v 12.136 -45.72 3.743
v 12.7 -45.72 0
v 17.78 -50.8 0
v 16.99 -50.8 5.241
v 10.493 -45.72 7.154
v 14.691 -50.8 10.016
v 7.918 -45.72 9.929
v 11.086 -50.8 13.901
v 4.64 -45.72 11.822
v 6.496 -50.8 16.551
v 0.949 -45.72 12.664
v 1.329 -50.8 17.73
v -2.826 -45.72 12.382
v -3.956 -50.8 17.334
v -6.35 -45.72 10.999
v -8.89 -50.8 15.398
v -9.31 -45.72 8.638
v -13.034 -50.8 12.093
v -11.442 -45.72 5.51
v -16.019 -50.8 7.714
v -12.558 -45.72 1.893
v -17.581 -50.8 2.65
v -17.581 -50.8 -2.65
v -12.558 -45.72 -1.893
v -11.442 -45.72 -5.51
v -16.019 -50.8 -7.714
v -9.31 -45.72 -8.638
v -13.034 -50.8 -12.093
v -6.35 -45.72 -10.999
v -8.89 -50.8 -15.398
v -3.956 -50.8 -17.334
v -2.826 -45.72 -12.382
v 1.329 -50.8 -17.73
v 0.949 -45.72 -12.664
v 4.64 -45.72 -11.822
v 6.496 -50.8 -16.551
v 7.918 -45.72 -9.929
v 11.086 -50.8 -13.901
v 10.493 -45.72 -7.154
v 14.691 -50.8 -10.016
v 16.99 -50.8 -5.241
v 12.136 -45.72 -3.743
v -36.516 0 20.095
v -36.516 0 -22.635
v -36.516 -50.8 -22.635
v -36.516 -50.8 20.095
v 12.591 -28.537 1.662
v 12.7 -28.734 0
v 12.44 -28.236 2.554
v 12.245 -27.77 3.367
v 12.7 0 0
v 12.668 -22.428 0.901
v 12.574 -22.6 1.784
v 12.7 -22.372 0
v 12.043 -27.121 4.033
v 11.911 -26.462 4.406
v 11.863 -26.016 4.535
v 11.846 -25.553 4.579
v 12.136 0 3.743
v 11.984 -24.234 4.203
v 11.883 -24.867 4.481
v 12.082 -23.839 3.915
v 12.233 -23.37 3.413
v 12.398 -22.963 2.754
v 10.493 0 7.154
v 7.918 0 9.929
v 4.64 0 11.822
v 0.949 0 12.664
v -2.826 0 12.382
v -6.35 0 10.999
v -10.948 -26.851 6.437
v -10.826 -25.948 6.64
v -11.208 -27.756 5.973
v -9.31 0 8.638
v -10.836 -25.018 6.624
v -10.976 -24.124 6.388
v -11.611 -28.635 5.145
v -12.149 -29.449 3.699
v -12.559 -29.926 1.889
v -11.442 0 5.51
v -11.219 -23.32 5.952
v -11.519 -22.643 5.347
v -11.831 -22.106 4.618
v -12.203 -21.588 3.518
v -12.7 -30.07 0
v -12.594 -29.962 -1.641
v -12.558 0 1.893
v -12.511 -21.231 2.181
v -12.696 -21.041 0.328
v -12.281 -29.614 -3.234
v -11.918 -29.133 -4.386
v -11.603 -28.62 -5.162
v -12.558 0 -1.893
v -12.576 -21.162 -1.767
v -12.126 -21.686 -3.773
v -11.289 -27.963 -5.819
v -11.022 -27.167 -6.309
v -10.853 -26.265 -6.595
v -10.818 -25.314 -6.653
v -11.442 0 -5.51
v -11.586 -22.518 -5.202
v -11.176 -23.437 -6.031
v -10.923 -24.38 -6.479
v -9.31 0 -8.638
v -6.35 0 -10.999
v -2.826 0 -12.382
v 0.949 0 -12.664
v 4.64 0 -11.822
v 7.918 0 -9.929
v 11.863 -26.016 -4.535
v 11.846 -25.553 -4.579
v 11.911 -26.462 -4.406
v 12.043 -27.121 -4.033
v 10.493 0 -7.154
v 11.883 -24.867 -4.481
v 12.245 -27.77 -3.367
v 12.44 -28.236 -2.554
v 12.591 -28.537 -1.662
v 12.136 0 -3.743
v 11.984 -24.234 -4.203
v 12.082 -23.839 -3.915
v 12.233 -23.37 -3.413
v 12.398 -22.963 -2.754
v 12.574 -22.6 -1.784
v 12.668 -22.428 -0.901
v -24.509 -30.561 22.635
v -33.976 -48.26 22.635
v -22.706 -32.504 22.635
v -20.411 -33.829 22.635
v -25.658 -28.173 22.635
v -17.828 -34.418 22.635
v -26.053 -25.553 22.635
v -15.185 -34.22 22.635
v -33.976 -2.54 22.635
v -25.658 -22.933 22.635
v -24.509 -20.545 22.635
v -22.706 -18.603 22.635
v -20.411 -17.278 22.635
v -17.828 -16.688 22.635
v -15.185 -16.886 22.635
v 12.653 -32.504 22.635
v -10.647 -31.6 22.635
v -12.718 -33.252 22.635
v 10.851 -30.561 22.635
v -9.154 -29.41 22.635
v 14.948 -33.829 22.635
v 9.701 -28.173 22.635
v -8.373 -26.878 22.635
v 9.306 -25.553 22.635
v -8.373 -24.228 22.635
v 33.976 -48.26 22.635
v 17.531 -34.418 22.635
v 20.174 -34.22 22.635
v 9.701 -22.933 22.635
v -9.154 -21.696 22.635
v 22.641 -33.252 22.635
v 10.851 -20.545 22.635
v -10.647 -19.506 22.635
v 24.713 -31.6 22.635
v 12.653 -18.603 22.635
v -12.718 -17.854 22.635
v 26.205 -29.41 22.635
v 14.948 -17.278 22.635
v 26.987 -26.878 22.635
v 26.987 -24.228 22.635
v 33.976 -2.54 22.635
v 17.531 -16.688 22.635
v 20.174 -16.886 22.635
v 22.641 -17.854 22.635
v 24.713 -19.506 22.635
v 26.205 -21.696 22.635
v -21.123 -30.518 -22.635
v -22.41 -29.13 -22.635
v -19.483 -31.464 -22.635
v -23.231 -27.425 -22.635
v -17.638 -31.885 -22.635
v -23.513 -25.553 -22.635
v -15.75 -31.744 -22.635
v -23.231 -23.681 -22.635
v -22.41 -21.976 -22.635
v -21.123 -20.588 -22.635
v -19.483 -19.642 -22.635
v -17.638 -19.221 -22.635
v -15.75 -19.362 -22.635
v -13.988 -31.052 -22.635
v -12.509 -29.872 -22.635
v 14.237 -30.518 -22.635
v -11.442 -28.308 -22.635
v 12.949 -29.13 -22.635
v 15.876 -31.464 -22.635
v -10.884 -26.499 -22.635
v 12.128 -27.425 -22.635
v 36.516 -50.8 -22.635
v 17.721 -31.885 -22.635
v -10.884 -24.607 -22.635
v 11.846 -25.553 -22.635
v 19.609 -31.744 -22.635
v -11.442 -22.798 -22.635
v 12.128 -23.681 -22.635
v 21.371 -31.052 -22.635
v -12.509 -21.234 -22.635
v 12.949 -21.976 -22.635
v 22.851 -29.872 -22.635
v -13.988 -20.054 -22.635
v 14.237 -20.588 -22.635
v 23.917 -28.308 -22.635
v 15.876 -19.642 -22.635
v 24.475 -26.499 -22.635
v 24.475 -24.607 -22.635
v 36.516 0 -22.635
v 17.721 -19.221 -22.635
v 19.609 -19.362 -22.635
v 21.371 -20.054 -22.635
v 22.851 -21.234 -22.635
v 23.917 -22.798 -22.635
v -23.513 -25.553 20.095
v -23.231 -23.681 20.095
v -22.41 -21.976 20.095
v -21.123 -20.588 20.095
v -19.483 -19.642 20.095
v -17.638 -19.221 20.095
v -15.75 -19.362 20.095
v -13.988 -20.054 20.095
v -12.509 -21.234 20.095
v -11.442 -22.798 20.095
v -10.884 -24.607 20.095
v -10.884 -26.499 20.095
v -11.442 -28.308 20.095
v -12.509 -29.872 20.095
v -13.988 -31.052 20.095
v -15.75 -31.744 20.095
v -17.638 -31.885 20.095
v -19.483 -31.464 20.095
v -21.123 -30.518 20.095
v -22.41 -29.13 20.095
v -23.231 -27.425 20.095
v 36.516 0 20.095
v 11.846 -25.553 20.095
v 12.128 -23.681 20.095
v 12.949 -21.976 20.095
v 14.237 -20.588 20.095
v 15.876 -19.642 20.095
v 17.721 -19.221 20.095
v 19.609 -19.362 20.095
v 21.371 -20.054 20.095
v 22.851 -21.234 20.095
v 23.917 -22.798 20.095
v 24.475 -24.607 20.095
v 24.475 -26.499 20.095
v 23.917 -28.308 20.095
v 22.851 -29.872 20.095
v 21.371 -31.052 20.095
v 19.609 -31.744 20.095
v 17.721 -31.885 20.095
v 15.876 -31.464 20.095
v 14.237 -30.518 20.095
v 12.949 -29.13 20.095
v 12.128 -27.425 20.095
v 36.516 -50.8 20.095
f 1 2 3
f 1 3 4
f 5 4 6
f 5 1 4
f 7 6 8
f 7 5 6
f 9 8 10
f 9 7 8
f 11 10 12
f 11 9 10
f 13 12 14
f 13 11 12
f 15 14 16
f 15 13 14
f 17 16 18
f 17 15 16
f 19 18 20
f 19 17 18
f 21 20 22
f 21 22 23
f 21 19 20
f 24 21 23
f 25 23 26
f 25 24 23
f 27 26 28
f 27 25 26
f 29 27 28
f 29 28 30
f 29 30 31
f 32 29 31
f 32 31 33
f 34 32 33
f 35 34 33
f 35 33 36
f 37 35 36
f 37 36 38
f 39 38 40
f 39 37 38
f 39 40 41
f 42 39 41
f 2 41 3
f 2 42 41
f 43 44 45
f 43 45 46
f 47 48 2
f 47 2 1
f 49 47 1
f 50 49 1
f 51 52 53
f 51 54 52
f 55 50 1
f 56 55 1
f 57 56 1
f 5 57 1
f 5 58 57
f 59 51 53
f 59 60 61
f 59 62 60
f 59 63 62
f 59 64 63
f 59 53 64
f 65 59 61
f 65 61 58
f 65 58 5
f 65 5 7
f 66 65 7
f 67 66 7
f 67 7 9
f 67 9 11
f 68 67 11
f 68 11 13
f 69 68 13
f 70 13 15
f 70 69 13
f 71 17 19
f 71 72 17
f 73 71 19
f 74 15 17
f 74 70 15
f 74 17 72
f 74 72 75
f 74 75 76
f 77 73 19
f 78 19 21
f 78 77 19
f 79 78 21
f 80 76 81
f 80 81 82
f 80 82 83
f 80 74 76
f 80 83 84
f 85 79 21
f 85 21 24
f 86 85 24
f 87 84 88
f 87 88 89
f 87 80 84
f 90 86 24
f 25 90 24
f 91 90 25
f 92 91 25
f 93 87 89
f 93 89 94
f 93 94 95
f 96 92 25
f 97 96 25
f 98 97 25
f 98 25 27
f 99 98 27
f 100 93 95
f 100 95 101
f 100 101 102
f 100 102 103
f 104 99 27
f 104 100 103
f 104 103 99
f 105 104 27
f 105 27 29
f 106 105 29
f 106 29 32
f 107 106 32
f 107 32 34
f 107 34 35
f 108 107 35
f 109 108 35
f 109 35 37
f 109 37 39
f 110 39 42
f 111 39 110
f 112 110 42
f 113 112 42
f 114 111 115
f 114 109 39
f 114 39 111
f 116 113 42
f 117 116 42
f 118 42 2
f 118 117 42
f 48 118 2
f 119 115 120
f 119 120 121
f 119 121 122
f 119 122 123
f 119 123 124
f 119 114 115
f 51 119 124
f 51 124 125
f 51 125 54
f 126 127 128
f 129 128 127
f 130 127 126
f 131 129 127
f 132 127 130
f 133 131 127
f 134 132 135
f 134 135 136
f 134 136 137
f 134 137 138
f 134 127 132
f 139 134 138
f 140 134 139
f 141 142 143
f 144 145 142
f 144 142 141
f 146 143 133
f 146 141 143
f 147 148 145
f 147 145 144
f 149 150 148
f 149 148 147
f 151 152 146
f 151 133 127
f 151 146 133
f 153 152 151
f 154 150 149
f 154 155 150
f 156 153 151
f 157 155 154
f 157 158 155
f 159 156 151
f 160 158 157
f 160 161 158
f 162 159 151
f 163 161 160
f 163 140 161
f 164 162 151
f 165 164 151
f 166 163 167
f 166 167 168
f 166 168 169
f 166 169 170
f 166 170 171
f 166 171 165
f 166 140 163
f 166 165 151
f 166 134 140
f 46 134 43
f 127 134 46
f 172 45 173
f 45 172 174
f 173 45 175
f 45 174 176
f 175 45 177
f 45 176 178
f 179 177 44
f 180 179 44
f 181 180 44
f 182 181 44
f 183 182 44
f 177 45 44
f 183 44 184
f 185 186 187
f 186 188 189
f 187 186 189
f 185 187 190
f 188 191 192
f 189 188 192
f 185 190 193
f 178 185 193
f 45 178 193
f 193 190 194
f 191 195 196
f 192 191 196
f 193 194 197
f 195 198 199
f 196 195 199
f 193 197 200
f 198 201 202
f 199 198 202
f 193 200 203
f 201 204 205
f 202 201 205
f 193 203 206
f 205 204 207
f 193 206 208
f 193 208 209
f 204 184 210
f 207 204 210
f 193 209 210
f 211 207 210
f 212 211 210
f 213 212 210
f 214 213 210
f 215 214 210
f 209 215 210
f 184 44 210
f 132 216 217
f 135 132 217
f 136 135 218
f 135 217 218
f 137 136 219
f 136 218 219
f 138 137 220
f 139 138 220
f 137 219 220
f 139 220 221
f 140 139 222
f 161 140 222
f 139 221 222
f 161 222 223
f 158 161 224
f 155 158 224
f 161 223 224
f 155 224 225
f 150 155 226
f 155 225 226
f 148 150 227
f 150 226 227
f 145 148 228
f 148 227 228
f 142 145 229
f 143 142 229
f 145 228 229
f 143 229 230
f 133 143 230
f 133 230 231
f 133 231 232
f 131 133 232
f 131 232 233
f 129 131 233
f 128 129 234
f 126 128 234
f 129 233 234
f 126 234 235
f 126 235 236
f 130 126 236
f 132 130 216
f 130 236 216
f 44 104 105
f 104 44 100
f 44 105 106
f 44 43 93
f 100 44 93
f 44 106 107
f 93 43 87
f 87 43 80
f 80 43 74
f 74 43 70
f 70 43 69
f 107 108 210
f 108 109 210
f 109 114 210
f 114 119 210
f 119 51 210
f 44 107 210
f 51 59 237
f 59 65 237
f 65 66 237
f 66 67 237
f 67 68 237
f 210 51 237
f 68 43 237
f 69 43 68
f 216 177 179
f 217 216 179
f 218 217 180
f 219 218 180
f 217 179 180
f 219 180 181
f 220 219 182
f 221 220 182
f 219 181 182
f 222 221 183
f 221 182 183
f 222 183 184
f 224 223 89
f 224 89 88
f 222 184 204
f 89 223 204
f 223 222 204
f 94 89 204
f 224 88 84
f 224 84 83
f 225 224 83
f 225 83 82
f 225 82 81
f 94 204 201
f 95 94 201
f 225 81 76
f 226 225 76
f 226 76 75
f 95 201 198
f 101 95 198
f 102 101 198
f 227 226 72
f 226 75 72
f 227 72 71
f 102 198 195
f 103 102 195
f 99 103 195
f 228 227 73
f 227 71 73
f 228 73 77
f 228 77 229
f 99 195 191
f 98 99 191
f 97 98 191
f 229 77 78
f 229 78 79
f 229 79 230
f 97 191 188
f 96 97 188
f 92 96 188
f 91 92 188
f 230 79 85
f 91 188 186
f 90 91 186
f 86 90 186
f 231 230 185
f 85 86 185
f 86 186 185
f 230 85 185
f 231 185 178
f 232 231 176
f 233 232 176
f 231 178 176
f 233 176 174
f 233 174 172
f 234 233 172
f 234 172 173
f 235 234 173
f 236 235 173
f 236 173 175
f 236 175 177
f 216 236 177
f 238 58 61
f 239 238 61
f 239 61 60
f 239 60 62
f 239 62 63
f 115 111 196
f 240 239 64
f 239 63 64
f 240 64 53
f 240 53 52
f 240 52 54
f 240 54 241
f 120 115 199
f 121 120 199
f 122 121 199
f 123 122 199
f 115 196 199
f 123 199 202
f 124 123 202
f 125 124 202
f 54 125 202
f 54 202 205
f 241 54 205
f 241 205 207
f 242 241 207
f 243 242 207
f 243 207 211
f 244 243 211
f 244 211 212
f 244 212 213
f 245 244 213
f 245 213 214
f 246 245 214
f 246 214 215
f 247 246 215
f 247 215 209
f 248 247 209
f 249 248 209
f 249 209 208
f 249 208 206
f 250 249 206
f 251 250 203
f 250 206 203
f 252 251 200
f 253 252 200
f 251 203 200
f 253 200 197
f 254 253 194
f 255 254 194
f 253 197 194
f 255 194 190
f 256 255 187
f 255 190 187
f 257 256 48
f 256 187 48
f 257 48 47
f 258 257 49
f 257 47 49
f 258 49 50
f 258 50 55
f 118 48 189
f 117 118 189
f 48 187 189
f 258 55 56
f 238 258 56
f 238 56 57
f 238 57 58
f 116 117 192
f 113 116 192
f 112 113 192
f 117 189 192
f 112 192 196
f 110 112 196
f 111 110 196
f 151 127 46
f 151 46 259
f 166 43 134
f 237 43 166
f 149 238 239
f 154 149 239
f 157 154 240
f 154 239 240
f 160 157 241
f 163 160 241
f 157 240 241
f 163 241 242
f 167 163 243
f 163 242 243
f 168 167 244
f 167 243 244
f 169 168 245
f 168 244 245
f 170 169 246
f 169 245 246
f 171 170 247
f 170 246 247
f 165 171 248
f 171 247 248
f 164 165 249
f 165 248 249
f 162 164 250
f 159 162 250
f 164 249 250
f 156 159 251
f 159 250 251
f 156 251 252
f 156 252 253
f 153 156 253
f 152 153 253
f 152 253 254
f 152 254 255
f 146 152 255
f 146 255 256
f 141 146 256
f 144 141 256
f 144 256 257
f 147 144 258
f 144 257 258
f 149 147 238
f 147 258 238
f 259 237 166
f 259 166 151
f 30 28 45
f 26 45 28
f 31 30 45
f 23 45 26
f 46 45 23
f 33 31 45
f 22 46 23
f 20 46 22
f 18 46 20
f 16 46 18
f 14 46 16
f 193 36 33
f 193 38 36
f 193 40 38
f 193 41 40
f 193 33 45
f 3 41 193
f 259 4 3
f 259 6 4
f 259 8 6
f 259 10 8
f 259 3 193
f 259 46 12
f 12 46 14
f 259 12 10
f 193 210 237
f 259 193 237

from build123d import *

# Parameters (mm, degrees)
F0_W     = 73.031252
F0_H     = 45.270924
F0_R     = 12.7
F1_DEPTH = 50.8
F3_D     = 12.7
F4_SIZE  = 5.08
F5_SIZE  = 2.54


with BuildPart() as f1:
    # F0 (on Front) → F1 (new body)
    with BuildSketch(Plane.XZ):
        Rectangle(F0_W, F0_H)
        Circle(F0_R, mode=Mode.SUBTRACT)
    extrude(amount=F1_DEPTH)

    # F3 (through all)
    with Locations(Plane.XY.offset(22.635462)):
        with Locations((-17.163437, -25.553048), (18.195821, -25.553048)):
            Hole(F3_D / 2)

    # F4
    f4_edges = [f1.edges().sort_by_distance(p)[0] for p in [
        (-12.7, -50.8, 0),
    ]]
    chamfer(f4_edges, length=F4_SIZE)

    # F5
    f5_edges = [f1.edges().sort_by_distance(p)[0] for p in [
        (36.515626, -25.4, 22.635462),
        (0, 0, 22.635462),
        (0, -50.8, 22.635462),
        (-36.515626, -25.4, 22.635462),
        (11.845821, -25.553048, 22.635462),
        (-23.513437, -25.553048, 22.635462),
    ]]
    chamfer(f5_edges, length=F5_SIZE)


solid = f1.part
